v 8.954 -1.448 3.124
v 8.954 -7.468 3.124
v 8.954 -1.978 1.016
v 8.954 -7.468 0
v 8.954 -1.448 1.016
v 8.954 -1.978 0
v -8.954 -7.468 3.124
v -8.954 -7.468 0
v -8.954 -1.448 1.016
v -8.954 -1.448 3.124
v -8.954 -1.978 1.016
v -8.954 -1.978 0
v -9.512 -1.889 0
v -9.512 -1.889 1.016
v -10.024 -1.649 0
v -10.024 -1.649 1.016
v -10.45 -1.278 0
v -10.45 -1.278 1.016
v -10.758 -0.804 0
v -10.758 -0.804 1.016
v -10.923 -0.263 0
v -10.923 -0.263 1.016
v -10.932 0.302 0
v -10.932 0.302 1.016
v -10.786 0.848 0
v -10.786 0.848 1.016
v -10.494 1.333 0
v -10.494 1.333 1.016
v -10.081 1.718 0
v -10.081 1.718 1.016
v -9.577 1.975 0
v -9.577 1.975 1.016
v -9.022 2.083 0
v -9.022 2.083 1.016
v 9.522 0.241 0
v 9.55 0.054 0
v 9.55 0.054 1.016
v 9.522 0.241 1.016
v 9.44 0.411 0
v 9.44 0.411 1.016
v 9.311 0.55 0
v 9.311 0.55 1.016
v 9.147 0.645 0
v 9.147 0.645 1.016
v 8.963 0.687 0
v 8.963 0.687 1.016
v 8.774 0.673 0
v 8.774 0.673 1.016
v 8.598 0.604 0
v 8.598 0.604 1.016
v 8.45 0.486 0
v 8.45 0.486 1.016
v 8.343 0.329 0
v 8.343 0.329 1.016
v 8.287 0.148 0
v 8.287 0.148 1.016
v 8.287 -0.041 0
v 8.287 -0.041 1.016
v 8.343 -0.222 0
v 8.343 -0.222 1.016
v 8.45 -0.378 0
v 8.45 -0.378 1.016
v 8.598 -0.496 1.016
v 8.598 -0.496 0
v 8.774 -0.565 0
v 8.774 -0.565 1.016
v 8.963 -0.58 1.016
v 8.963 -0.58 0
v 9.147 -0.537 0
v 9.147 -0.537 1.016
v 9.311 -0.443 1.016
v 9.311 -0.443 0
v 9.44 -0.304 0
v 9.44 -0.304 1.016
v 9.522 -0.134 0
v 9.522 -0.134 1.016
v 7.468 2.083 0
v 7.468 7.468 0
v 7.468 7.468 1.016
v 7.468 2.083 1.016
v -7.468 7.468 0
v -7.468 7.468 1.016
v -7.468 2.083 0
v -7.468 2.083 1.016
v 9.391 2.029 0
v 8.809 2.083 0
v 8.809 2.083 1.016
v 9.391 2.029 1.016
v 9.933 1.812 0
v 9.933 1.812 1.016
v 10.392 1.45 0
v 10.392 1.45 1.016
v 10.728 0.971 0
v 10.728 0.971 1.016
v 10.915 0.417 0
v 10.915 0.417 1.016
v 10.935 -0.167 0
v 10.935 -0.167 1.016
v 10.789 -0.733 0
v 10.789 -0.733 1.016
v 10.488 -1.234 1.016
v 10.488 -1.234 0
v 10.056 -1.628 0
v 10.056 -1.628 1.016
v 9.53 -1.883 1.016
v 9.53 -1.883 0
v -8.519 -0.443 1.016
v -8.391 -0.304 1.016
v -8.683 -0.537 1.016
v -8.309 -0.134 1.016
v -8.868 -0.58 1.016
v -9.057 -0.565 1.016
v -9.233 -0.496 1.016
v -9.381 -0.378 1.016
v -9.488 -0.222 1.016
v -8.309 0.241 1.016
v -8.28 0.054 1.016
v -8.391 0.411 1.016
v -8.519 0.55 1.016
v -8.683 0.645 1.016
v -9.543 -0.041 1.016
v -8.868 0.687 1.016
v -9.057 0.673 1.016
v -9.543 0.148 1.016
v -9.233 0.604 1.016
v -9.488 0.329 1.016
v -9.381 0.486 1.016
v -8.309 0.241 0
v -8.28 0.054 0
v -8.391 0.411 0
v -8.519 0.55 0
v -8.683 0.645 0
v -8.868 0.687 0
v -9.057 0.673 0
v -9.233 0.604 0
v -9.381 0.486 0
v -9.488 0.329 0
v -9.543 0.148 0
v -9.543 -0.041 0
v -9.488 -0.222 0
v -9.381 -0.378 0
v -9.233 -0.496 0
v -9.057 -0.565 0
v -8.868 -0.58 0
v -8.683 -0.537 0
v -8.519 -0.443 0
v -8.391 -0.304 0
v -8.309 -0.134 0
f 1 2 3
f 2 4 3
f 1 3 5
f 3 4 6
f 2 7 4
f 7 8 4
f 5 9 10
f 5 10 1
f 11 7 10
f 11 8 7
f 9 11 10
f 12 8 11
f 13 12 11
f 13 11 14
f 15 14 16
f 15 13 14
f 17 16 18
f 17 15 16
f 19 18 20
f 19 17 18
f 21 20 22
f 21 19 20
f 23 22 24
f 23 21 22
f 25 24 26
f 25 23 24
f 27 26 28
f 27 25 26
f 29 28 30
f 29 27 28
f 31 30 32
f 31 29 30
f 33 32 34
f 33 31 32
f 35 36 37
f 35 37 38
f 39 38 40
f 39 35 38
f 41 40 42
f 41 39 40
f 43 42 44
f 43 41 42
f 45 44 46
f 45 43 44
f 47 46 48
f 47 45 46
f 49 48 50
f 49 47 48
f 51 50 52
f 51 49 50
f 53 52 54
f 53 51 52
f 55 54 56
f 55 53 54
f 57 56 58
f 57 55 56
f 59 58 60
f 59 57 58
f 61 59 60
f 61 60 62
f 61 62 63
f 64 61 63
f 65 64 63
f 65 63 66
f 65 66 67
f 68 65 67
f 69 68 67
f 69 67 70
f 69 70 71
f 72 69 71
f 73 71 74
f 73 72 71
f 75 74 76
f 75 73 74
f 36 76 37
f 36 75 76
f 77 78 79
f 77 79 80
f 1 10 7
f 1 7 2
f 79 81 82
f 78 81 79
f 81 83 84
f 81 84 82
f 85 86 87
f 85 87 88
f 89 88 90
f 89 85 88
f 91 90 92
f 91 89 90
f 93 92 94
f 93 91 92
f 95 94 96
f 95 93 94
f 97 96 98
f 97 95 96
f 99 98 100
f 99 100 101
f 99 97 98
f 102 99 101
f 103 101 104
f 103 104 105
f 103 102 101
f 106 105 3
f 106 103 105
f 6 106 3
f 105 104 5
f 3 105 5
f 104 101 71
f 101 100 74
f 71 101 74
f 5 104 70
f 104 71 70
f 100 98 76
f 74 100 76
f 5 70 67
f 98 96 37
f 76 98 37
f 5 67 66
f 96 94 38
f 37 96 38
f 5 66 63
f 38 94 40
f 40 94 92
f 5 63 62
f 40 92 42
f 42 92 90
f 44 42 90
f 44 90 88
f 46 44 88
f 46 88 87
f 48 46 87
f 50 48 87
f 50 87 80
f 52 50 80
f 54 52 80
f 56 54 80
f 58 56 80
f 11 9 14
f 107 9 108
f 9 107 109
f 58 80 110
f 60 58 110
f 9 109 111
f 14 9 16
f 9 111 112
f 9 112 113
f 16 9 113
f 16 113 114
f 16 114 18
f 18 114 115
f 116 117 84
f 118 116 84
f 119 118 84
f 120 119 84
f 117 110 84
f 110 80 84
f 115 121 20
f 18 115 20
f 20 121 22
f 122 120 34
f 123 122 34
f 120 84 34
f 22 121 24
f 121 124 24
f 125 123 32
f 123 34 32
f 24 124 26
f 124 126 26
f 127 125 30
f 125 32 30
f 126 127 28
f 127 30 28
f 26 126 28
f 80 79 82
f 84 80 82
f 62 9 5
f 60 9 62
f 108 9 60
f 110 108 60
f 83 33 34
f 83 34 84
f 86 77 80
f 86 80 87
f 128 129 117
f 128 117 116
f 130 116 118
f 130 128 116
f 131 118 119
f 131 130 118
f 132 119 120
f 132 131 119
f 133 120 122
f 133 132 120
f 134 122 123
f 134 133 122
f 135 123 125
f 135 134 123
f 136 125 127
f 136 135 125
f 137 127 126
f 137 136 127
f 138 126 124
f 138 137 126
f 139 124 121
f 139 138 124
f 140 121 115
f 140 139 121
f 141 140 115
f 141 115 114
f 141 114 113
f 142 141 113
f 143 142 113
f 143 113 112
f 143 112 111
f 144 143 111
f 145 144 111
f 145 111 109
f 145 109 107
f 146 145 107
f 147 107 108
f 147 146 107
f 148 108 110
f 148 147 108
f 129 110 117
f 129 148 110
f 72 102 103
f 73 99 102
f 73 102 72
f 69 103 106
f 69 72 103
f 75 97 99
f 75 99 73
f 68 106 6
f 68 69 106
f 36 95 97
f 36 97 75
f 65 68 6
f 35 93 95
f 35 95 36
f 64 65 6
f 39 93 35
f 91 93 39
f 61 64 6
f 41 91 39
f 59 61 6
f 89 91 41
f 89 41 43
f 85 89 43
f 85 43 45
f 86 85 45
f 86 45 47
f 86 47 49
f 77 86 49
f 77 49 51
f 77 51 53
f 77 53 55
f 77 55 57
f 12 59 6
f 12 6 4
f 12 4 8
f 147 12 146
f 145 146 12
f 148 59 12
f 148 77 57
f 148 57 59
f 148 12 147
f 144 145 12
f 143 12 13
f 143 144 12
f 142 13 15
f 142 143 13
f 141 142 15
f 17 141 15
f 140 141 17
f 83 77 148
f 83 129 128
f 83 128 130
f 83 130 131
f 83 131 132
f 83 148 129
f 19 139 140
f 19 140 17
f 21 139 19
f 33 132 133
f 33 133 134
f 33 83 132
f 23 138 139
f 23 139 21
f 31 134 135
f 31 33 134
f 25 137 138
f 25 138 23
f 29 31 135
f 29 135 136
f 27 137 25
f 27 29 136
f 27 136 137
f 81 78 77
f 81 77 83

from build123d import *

# Parameters (mm, degrees)
SKETCH1_R           = 0.635000006
BOSS_EXTRUDE1_DEPTH = 1.016
SKETCH2_W           = 17.907
SKETCH2_H           = 6.0198
BOSS_EXTRUDE2_DEPTH = 2.1082


with BuildPart() as part:
    # Sketch1 → Boss-Extrude1 (new body)
    with BuildSketch(Plane.XY):
        with BuildLine():
            Line((-7.4676, 7.4676), (7.4676, 7.4676))
            Line((7.4676, 7.4676), (7.4676, 2.0828))
            Line((7.4676, 2.0828), (8.808625011, 2.0828))
            ThreePointArc((8.808625011, 2.0828), (10.946108081, 0.126055131), (8.9535, -1.978035503))
            Line((8.9535, -1.978035503), (8.9535, -7.4676))
            Line((8.9535, -7.4676), (-8.9535, -7.4676))
            Line((-8.9535, -7.4676), (-8.9535, -1.978035503))
            ThreePointArc((-8.9535, -1.978035503), (-10.947109486, 0.019247939), (-9.022174989, 2.0828))
            Line((-9.022174989, 2.0828), (-7.4676, 2.0828))
            Line((-7.4676, 2.0828), (-7.4676, 7.4676))
        make_face()
        with Locations((-8.9154, 0.053607278)):
            Circle(SKETCH1_R, mode=Mode.SUBTRACT)
        with Locations((8.9154, 0.053607278)):
            Circle(SKETCH1_R, mode=Mode.SUBTRACT)
    extrude(amount=BOSS_EXTRUDE1_DEPTH)

    # Sketch2 → Boss-Extrude2 (add)
    with BuildSketch(Plane.XY.offset(1.016)):
        with Locations((0, -4.4577)):
            Rectangle(SKETCH2_W, SKETCH2_H)
    extrude(amount=BOSS_EXTRUDE2_DEPTH)


solid = part.part
